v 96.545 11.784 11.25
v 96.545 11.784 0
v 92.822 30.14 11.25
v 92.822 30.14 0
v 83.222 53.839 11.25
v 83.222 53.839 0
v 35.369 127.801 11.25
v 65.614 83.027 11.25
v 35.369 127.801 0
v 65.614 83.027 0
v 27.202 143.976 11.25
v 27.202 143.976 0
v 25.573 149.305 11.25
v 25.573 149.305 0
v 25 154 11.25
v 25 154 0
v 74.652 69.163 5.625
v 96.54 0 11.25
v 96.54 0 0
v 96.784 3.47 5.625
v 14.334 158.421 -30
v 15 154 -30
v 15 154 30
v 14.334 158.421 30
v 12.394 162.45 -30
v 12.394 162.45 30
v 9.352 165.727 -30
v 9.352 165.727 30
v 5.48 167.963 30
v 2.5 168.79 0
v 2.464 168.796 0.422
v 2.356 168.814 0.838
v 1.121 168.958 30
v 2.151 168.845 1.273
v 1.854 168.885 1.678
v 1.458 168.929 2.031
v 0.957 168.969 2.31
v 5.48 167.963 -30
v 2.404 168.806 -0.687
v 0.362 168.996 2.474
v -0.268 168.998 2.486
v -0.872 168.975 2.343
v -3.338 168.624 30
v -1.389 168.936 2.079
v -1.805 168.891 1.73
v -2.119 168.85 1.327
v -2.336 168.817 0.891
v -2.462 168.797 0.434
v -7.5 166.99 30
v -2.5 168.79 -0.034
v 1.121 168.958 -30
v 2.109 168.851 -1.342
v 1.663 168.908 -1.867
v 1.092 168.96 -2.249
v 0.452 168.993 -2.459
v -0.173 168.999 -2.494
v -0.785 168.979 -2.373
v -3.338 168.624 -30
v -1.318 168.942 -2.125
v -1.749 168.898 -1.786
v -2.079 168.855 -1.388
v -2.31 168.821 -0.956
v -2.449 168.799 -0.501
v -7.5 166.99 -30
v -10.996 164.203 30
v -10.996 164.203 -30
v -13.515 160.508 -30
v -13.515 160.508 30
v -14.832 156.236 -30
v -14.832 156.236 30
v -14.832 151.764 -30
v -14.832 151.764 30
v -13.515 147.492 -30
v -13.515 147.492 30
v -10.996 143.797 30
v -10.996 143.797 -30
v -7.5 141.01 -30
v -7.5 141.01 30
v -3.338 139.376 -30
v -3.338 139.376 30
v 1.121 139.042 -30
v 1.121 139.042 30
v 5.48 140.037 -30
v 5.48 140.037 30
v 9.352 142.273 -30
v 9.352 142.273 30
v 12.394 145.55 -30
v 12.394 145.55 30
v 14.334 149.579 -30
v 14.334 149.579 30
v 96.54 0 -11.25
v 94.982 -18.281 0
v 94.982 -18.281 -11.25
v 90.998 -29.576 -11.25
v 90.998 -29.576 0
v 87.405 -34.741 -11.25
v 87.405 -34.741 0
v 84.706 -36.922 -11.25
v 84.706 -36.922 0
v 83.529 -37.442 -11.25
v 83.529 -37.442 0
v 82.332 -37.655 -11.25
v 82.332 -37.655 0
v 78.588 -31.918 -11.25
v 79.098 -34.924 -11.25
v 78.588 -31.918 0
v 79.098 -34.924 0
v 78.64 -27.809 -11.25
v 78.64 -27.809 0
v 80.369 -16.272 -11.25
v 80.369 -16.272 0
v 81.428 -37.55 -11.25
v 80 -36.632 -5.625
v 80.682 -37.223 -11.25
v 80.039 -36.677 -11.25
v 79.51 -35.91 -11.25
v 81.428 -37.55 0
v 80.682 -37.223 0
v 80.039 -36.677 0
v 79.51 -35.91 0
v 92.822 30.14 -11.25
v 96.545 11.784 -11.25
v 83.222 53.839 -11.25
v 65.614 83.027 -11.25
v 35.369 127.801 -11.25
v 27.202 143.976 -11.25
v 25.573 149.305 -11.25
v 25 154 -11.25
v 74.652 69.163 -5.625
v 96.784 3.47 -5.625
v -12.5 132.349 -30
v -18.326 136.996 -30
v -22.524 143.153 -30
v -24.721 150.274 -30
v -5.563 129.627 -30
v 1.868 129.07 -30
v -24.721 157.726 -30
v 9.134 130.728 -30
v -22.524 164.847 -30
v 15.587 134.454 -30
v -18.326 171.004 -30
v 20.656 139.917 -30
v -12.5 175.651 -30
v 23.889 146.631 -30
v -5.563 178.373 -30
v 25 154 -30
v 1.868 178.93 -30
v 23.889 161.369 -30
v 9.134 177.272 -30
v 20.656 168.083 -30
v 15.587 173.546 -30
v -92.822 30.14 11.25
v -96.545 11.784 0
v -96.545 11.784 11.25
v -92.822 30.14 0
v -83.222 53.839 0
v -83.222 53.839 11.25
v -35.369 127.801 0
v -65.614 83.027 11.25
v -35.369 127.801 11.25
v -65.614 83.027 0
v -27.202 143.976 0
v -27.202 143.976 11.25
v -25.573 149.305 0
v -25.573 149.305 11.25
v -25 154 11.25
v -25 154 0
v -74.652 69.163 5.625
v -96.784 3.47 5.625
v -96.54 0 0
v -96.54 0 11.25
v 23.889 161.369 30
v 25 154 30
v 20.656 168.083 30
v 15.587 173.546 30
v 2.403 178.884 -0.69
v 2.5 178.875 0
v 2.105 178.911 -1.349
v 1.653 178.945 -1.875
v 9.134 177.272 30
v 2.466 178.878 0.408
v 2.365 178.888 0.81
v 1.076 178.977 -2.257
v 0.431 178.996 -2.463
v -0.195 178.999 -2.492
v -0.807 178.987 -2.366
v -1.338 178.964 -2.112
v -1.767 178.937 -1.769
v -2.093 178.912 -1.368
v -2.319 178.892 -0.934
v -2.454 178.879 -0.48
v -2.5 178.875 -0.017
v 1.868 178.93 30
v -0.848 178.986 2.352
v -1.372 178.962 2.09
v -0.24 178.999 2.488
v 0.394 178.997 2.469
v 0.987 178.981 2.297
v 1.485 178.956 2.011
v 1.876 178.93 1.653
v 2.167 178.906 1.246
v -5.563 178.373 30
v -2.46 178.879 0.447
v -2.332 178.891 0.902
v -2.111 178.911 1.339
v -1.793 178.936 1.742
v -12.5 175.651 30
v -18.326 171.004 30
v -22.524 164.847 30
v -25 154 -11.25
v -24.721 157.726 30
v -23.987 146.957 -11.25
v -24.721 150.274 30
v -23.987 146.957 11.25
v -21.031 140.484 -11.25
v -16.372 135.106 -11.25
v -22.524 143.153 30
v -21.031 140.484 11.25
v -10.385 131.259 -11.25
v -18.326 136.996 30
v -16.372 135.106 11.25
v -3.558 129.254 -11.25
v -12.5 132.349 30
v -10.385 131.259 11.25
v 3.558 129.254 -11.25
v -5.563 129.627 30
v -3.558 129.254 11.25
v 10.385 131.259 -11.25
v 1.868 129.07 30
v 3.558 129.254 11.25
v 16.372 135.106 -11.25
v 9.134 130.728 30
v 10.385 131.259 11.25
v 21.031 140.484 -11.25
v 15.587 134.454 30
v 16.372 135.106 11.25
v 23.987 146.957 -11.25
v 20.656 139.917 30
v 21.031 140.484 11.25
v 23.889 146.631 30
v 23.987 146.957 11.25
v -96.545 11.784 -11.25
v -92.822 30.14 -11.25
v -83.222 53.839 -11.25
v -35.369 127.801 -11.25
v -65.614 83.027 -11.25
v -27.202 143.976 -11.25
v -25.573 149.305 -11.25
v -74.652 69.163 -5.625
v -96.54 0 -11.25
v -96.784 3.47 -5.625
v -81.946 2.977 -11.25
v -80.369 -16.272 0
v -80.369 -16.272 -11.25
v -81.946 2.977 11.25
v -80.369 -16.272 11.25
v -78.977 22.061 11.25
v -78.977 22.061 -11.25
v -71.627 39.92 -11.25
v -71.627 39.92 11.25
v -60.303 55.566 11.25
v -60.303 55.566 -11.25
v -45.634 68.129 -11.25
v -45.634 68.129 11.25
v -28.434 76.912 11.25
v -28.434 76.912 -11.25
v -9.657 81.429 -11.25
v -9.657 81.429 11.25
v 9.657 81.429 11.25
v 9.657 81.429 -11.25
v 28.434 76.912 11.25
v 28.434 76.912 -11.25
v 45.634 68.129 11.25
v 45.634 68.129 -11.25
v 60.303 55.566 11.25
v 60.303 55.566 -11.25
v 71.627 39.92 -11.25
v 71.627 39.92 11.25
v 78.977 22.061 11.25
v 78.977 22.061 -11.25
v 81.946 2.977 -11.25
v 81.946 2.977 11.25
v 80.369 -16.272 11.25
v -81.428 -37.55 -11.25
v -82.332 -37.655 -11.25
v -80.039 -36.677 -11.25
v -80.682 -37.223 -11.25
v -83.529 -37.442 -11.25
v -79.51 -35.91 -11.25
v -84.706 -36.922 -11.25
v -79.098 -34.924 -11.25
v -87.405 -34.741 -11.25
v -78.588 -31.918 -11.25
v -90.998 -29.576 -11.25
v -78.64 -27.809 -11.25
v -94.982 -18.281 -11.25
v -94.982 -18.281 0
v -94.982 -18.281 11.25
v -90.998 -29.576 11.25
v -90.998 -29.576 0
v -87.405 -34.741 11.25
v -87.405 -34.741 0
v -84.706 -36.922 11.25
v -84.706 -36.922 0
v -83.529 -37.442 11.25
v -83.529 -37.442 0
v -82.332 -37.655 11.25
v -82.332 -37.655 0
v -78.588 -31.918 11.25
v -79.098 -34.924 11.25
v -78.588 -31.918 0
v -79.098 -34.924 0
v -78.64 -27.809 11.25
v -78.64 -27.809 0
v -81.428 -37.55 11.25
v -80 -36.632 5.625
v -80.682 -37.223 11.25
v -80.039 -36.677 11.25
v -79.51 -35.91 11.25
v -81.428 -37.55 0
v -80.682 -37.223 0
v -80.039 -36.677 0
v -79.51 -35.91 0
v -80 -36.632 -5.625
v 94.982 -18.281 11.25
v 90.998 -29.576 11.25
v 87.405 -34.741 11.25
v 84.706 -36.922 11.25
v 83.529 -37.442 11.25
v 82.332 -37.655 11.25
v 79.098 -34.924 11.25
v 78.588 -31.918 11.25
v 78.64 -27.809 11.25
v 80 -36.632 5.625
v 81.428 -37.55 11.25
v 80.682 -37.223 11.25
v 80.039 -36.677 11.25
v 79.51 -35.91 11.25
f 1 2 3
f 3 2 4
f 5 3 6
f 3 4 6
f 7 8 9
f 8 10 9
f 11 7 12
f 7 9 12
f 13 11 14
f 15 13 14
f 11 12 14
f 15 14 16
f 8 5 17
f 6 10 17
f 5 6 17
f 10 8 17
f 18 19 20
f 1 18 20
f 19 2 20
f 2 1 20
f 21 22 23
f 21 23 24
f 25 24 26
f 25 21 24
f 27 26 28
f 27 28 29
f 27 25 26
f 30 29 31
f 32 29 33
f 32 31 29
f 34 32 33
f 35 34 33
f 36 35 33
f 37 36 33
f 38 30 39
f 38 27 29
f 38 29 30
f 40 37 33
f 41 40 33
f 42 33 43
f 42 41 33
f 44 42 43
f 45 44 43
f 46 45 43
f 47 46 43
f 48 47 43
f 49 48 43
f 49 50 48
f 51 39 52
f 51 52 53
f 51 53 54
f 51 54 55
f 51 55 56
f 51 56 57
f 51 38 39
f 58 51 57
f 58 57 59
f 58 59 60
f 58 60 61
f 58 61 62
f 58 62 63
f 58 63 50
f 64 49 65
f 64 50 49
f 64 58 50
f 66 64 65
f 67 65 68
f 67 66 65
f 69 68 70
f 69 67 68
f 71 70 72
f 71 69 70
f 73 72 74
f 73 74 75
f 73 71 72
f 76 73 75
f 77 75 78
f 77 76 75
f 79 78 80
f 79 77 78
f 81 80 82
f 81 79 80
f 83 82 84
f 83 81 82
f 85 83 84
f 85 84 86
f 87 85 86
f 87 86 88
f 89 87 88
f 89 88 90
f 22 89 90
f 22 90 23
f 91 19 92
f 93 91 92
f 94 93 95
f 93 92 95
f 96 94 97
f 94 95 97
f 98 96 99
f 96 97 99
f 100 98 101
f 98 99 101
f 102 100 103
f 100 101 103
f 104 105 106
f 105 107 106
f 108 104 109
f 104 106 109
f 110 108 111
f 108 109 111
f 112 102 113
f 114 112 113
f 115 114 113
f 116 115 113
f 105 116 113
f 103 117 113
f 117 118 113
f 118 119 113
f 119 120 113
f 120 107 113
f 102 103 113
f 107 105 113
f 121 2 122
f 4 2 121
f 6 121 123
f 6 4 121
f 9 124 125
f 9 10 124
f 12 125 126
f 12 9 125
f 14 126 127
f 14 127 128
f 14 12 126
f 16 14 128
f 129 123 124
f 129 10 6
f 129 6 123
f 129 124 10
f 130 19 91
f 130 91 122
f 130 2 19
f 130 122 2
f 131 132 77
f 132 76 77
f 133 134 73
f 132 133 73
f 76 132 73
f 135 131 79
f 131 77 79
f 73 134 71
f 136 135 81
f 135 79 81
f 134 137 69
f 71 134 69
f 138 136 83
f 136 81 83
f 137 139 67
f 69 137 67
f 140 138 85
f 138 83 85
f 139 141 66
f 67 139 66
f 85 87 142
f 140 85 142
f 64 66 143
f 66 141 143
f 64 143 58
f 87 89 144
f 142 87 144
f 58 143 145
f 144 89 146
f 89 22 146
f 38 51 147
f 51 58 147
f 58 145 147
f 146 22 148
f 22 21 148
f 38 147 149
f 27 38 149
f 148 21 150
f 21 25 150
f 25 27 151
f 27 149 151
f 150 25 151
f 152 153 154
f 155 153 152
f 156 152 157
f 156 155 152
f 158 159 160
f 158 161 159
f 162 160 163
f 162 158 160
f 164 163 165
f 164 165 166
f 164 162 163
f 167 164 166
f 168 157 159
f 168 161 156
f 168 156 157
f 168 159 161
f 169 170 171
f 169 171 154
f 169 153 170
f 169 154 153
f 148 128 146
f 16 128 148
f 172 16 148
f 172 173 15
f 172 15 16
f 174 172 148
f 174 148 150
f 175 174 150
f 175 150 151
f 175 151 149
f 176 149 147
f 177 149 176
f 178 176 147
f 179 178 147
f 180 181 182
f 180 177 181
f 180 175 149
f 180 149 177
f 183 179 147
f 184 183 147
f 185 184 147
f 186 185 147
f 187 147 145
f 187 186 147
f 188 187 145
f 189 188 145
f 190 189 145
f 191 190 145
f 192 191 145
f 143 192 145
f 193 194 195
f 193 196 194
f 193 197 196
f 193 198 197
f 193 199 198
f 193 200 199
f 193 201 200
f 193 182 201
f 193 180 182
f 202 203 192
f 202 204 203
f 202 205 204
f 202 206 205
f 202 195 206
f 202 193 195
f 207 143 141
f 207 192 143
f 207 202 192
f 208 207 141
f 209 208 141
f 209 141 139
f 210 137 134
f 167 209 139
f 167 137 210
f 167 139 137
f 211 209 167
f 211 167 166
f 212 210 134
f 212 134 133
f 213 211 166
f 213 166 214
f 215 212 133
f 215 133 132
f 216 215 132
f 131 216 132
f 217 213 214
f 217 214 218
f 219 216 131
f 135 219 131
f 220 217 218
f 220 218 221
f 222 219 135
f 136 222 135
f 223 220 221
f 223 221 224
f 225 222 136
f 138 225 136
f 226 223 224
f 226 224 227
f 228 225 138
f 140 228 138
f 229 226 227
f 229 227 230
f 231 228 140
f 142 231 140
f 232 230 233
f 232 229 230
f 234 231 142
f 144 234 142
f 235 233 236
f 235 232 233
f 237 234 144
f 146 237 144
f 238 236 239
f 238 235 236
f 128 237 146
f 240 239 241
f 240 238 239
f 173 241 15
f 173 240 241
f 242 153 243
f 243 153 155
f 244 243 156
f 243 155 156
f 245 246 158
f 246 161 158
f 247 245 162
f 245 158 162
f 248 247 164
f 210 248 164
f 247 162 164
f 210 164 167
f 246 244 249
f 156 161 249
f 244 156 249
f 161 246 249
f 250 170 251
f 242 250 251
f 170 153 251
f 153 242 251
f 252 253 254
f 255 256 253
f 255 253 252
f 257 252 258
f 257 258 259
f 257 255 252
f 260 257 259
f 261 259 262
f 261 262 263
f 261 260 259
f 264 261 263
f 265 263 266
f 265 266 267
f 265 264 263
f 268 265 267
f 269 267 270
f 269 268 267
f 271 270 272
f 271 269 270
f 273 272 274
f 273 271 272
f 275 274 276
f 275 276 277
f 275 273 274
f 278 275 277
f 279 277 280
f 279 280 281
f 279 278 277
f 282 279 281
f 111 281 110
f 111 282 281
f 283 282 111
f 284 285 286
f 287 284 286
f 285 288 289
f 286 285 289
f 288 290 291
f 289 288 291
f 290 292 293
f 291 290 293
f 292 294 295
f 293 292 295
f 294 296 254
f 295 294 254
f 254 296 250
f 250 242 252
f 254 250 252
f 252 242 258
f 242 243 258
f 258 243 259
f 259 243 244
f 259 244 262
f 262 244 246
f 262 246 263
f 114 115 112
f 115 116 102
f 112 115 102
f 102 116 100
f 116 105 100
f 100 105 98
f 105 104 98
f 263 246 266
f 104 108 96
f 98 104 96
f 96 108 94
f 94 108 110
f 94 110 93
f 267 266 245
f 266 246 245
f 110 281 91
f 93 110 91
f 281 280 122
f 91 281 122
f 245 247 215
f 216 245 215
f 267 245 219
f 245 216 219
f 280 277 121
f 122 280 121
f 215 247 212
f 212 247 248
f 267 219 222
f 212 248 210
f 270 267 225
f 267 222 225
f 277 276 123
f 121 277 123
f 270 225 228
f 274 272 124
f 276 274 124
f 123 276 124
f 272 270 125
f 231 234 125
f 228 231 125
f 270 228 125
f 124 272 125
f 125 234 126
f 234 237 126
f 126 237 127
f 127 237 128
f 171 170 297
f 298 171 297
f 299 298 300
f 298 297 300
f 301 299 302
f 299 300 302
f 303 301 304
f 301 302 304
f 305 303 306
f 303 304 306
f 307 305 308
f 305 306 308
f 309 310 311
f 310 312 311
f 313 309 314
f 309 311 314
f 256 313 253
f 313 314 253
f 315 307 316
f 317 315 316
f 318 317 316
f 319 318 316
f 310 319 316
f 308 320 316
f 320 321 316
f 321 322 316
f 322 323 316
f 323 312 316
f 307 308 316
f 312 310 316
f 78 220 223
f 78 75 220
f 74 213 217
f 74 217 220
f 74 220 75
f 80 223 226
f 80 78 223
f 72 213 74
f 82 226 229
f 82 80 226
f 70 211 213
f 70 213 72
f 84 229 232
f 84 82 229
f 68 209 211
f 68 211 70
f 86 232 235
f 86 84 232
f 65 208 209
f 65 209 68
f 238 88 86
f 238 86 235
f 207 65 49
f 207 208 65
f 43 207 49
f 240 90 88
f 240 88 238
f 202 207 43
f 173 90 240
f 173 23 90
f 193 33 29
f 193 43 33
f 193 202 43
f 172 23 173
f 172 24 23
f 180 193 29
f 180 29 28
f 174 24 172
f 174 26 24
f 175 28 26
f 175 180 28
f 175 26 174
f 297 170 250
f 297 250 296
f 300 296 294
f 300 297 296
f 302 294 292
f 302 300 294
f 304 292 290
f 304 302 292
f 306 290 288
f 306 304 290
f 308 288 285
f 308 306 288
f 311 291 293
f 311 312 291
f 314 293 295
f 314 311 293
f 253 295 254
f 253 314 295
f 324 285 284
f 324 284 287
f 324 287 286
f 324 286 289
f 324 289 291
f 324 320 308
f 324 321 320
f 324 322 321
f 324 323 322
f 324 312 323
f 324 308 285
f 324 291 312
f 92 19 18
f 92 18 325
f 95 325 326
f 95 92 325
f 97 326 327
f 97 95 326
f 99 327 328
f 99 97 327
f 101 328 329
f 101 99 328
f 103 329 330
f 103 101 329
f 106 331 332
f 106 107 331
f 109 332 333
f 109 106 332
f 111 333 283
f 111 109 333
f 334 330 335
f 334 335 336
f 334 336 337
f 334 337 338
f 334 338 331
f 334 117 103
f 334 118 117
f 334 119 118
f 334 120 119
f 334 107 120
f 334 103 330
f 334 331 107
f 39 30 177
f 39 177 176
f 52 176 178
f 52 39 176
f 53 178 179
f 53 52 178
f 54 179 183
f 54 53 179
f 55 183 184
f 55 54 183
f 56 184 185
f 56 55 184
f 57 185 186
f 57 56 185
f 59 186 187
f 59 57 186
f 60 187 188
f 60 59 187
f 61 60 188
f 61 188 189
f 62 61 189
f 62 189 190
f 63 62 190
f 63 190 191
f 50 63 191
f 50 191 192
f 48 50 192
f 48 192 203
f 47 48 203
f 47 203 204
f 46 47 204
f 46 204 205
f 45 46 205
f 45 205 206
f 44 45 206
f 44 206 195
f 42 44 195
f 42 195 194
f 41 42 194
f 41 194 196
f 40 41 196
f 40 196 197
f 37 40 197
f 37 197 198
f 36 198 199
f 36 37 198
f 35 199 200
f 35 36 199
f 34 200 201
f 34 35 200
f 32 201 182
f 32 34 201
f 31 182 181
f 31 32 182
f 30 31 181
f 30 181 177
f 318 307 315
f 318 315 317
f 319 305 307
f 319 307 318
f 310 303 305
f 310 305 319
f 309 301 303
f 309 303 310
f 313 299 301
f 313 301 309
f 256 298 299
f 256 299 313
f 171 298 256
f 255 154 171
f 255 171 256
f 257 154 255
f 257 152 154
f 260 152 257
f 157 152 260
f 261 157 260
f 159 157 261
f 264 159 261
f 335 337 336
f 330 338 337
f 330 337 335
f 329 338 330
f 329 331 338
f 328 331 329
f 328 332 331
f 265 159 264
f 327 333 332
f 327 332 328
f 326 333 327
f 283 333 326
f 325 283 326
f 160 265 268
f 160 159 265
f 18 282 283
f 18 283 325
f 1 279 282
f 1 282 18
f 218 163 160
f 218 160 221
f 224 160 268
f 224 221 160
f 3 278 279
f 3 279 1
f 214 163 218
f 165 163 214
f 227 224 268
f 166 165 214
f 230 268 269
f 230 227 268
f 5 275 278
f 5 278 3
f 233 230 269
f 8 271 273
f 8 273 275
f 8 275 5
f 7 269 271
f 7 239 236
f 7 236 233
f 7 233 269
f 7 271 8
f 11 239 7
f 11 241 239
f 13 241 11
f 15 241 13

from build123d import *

# Parameters (mm, degrees)
BOSS_EXTRUDE1_DEPTH = 11.25
SKETCH1_3_R         = 25
SKETCH1_3_R_2       = 15
BOSS_EXTRUDE2_DEPTH = 30
CUT_EXTRUDE1_START  = -30
SKETCH3_R           = 2.5
CUT_EXTRUDE1_DEPTH  = 31


with BuildPart() as part:
    # Sketch1 → Boss-Extrude1 (new body, symmetric)
    with BuildSketch(Plane.XY):
        with BuildLine():
            ThreePointArc((-80.369346148, -16.271699348), (0, 82), (80.369346148, -16.271699348))
            add(Edge.make_bspline(
                [(96.539745155, 0), (97.326558794, -29.331535138), (77.47349205, -47.573942744), (78.112479352, -27.418839229), (80.369346148, -16.271699348)],
                knots=[0, 0, 0, 0, 0.663724029, 1, 1, 1, 1], degree=3))
            add(Edge.make_bspline(
                [(96.539745155, 0), (96.493331921, 1.730233625), (104.346209231, 42.222860352), (25, 135.629553039), (25, 154)],
                knots=[0, 0, 0, 0, 0.598565743, 1, 1, 1, 1], degree=3))
            ThreePointArc((25, 154), (0, 129), (-25, 154))
            add(Edge.make_bspline(
                [(-96.539745155, 0), (-96.493331921, 1.730233625), (-104.346209231, 42.222860352), (-25, 135.629553039), (-25, 154)],
                knots=[0, 0, 0, 0, 0.598565743, 1, 1, 1, 1], degree=3))
            add(Edge.make_bspline(
                [(-96.539745155, 0), (-97.326558794, -29.331535138), (-77.47349205, -47.573942744), (-78.112479352, -27.418839229), (-80.369346148, -16.271699348)],
                knots=[0, 0, 0, 0, 0.663724029, 1, 1, 1, 1], degree=3))
        make_face()
    extrude(amount=BOSS_EXTRUDE1_DEPTH, both=True)

    # Sketch1<3> → Boss-Extrude2 (add, symmetric)
    with BuildSketch(Plane.XY):
        with Locations((0, 154)):
            Circle(SKETCH1_3_R)
        with Locations((0, 154)):
            Circle(SKETCH1_3_R_2, mode=Mode.SUBTRACT)
    extrude(amount=BOSS_EXTRUDE2_DEPTH, both=True)

    # Sketch3 → Cut-Extrude1 (cut, through all)
    with BuildSketch(Plane(origin=(0, 180, 0), x_dir=(1, 0, 0), z_dir=(0, 1, 0)).offset(CUT_EXTRUDE1_START)):
        Circle(SKETCH3_R)
    extrude(amount=CUT_EXTRUDE1_DEPTH, mode=Mode.SUBTRACT)


solid = part.part
